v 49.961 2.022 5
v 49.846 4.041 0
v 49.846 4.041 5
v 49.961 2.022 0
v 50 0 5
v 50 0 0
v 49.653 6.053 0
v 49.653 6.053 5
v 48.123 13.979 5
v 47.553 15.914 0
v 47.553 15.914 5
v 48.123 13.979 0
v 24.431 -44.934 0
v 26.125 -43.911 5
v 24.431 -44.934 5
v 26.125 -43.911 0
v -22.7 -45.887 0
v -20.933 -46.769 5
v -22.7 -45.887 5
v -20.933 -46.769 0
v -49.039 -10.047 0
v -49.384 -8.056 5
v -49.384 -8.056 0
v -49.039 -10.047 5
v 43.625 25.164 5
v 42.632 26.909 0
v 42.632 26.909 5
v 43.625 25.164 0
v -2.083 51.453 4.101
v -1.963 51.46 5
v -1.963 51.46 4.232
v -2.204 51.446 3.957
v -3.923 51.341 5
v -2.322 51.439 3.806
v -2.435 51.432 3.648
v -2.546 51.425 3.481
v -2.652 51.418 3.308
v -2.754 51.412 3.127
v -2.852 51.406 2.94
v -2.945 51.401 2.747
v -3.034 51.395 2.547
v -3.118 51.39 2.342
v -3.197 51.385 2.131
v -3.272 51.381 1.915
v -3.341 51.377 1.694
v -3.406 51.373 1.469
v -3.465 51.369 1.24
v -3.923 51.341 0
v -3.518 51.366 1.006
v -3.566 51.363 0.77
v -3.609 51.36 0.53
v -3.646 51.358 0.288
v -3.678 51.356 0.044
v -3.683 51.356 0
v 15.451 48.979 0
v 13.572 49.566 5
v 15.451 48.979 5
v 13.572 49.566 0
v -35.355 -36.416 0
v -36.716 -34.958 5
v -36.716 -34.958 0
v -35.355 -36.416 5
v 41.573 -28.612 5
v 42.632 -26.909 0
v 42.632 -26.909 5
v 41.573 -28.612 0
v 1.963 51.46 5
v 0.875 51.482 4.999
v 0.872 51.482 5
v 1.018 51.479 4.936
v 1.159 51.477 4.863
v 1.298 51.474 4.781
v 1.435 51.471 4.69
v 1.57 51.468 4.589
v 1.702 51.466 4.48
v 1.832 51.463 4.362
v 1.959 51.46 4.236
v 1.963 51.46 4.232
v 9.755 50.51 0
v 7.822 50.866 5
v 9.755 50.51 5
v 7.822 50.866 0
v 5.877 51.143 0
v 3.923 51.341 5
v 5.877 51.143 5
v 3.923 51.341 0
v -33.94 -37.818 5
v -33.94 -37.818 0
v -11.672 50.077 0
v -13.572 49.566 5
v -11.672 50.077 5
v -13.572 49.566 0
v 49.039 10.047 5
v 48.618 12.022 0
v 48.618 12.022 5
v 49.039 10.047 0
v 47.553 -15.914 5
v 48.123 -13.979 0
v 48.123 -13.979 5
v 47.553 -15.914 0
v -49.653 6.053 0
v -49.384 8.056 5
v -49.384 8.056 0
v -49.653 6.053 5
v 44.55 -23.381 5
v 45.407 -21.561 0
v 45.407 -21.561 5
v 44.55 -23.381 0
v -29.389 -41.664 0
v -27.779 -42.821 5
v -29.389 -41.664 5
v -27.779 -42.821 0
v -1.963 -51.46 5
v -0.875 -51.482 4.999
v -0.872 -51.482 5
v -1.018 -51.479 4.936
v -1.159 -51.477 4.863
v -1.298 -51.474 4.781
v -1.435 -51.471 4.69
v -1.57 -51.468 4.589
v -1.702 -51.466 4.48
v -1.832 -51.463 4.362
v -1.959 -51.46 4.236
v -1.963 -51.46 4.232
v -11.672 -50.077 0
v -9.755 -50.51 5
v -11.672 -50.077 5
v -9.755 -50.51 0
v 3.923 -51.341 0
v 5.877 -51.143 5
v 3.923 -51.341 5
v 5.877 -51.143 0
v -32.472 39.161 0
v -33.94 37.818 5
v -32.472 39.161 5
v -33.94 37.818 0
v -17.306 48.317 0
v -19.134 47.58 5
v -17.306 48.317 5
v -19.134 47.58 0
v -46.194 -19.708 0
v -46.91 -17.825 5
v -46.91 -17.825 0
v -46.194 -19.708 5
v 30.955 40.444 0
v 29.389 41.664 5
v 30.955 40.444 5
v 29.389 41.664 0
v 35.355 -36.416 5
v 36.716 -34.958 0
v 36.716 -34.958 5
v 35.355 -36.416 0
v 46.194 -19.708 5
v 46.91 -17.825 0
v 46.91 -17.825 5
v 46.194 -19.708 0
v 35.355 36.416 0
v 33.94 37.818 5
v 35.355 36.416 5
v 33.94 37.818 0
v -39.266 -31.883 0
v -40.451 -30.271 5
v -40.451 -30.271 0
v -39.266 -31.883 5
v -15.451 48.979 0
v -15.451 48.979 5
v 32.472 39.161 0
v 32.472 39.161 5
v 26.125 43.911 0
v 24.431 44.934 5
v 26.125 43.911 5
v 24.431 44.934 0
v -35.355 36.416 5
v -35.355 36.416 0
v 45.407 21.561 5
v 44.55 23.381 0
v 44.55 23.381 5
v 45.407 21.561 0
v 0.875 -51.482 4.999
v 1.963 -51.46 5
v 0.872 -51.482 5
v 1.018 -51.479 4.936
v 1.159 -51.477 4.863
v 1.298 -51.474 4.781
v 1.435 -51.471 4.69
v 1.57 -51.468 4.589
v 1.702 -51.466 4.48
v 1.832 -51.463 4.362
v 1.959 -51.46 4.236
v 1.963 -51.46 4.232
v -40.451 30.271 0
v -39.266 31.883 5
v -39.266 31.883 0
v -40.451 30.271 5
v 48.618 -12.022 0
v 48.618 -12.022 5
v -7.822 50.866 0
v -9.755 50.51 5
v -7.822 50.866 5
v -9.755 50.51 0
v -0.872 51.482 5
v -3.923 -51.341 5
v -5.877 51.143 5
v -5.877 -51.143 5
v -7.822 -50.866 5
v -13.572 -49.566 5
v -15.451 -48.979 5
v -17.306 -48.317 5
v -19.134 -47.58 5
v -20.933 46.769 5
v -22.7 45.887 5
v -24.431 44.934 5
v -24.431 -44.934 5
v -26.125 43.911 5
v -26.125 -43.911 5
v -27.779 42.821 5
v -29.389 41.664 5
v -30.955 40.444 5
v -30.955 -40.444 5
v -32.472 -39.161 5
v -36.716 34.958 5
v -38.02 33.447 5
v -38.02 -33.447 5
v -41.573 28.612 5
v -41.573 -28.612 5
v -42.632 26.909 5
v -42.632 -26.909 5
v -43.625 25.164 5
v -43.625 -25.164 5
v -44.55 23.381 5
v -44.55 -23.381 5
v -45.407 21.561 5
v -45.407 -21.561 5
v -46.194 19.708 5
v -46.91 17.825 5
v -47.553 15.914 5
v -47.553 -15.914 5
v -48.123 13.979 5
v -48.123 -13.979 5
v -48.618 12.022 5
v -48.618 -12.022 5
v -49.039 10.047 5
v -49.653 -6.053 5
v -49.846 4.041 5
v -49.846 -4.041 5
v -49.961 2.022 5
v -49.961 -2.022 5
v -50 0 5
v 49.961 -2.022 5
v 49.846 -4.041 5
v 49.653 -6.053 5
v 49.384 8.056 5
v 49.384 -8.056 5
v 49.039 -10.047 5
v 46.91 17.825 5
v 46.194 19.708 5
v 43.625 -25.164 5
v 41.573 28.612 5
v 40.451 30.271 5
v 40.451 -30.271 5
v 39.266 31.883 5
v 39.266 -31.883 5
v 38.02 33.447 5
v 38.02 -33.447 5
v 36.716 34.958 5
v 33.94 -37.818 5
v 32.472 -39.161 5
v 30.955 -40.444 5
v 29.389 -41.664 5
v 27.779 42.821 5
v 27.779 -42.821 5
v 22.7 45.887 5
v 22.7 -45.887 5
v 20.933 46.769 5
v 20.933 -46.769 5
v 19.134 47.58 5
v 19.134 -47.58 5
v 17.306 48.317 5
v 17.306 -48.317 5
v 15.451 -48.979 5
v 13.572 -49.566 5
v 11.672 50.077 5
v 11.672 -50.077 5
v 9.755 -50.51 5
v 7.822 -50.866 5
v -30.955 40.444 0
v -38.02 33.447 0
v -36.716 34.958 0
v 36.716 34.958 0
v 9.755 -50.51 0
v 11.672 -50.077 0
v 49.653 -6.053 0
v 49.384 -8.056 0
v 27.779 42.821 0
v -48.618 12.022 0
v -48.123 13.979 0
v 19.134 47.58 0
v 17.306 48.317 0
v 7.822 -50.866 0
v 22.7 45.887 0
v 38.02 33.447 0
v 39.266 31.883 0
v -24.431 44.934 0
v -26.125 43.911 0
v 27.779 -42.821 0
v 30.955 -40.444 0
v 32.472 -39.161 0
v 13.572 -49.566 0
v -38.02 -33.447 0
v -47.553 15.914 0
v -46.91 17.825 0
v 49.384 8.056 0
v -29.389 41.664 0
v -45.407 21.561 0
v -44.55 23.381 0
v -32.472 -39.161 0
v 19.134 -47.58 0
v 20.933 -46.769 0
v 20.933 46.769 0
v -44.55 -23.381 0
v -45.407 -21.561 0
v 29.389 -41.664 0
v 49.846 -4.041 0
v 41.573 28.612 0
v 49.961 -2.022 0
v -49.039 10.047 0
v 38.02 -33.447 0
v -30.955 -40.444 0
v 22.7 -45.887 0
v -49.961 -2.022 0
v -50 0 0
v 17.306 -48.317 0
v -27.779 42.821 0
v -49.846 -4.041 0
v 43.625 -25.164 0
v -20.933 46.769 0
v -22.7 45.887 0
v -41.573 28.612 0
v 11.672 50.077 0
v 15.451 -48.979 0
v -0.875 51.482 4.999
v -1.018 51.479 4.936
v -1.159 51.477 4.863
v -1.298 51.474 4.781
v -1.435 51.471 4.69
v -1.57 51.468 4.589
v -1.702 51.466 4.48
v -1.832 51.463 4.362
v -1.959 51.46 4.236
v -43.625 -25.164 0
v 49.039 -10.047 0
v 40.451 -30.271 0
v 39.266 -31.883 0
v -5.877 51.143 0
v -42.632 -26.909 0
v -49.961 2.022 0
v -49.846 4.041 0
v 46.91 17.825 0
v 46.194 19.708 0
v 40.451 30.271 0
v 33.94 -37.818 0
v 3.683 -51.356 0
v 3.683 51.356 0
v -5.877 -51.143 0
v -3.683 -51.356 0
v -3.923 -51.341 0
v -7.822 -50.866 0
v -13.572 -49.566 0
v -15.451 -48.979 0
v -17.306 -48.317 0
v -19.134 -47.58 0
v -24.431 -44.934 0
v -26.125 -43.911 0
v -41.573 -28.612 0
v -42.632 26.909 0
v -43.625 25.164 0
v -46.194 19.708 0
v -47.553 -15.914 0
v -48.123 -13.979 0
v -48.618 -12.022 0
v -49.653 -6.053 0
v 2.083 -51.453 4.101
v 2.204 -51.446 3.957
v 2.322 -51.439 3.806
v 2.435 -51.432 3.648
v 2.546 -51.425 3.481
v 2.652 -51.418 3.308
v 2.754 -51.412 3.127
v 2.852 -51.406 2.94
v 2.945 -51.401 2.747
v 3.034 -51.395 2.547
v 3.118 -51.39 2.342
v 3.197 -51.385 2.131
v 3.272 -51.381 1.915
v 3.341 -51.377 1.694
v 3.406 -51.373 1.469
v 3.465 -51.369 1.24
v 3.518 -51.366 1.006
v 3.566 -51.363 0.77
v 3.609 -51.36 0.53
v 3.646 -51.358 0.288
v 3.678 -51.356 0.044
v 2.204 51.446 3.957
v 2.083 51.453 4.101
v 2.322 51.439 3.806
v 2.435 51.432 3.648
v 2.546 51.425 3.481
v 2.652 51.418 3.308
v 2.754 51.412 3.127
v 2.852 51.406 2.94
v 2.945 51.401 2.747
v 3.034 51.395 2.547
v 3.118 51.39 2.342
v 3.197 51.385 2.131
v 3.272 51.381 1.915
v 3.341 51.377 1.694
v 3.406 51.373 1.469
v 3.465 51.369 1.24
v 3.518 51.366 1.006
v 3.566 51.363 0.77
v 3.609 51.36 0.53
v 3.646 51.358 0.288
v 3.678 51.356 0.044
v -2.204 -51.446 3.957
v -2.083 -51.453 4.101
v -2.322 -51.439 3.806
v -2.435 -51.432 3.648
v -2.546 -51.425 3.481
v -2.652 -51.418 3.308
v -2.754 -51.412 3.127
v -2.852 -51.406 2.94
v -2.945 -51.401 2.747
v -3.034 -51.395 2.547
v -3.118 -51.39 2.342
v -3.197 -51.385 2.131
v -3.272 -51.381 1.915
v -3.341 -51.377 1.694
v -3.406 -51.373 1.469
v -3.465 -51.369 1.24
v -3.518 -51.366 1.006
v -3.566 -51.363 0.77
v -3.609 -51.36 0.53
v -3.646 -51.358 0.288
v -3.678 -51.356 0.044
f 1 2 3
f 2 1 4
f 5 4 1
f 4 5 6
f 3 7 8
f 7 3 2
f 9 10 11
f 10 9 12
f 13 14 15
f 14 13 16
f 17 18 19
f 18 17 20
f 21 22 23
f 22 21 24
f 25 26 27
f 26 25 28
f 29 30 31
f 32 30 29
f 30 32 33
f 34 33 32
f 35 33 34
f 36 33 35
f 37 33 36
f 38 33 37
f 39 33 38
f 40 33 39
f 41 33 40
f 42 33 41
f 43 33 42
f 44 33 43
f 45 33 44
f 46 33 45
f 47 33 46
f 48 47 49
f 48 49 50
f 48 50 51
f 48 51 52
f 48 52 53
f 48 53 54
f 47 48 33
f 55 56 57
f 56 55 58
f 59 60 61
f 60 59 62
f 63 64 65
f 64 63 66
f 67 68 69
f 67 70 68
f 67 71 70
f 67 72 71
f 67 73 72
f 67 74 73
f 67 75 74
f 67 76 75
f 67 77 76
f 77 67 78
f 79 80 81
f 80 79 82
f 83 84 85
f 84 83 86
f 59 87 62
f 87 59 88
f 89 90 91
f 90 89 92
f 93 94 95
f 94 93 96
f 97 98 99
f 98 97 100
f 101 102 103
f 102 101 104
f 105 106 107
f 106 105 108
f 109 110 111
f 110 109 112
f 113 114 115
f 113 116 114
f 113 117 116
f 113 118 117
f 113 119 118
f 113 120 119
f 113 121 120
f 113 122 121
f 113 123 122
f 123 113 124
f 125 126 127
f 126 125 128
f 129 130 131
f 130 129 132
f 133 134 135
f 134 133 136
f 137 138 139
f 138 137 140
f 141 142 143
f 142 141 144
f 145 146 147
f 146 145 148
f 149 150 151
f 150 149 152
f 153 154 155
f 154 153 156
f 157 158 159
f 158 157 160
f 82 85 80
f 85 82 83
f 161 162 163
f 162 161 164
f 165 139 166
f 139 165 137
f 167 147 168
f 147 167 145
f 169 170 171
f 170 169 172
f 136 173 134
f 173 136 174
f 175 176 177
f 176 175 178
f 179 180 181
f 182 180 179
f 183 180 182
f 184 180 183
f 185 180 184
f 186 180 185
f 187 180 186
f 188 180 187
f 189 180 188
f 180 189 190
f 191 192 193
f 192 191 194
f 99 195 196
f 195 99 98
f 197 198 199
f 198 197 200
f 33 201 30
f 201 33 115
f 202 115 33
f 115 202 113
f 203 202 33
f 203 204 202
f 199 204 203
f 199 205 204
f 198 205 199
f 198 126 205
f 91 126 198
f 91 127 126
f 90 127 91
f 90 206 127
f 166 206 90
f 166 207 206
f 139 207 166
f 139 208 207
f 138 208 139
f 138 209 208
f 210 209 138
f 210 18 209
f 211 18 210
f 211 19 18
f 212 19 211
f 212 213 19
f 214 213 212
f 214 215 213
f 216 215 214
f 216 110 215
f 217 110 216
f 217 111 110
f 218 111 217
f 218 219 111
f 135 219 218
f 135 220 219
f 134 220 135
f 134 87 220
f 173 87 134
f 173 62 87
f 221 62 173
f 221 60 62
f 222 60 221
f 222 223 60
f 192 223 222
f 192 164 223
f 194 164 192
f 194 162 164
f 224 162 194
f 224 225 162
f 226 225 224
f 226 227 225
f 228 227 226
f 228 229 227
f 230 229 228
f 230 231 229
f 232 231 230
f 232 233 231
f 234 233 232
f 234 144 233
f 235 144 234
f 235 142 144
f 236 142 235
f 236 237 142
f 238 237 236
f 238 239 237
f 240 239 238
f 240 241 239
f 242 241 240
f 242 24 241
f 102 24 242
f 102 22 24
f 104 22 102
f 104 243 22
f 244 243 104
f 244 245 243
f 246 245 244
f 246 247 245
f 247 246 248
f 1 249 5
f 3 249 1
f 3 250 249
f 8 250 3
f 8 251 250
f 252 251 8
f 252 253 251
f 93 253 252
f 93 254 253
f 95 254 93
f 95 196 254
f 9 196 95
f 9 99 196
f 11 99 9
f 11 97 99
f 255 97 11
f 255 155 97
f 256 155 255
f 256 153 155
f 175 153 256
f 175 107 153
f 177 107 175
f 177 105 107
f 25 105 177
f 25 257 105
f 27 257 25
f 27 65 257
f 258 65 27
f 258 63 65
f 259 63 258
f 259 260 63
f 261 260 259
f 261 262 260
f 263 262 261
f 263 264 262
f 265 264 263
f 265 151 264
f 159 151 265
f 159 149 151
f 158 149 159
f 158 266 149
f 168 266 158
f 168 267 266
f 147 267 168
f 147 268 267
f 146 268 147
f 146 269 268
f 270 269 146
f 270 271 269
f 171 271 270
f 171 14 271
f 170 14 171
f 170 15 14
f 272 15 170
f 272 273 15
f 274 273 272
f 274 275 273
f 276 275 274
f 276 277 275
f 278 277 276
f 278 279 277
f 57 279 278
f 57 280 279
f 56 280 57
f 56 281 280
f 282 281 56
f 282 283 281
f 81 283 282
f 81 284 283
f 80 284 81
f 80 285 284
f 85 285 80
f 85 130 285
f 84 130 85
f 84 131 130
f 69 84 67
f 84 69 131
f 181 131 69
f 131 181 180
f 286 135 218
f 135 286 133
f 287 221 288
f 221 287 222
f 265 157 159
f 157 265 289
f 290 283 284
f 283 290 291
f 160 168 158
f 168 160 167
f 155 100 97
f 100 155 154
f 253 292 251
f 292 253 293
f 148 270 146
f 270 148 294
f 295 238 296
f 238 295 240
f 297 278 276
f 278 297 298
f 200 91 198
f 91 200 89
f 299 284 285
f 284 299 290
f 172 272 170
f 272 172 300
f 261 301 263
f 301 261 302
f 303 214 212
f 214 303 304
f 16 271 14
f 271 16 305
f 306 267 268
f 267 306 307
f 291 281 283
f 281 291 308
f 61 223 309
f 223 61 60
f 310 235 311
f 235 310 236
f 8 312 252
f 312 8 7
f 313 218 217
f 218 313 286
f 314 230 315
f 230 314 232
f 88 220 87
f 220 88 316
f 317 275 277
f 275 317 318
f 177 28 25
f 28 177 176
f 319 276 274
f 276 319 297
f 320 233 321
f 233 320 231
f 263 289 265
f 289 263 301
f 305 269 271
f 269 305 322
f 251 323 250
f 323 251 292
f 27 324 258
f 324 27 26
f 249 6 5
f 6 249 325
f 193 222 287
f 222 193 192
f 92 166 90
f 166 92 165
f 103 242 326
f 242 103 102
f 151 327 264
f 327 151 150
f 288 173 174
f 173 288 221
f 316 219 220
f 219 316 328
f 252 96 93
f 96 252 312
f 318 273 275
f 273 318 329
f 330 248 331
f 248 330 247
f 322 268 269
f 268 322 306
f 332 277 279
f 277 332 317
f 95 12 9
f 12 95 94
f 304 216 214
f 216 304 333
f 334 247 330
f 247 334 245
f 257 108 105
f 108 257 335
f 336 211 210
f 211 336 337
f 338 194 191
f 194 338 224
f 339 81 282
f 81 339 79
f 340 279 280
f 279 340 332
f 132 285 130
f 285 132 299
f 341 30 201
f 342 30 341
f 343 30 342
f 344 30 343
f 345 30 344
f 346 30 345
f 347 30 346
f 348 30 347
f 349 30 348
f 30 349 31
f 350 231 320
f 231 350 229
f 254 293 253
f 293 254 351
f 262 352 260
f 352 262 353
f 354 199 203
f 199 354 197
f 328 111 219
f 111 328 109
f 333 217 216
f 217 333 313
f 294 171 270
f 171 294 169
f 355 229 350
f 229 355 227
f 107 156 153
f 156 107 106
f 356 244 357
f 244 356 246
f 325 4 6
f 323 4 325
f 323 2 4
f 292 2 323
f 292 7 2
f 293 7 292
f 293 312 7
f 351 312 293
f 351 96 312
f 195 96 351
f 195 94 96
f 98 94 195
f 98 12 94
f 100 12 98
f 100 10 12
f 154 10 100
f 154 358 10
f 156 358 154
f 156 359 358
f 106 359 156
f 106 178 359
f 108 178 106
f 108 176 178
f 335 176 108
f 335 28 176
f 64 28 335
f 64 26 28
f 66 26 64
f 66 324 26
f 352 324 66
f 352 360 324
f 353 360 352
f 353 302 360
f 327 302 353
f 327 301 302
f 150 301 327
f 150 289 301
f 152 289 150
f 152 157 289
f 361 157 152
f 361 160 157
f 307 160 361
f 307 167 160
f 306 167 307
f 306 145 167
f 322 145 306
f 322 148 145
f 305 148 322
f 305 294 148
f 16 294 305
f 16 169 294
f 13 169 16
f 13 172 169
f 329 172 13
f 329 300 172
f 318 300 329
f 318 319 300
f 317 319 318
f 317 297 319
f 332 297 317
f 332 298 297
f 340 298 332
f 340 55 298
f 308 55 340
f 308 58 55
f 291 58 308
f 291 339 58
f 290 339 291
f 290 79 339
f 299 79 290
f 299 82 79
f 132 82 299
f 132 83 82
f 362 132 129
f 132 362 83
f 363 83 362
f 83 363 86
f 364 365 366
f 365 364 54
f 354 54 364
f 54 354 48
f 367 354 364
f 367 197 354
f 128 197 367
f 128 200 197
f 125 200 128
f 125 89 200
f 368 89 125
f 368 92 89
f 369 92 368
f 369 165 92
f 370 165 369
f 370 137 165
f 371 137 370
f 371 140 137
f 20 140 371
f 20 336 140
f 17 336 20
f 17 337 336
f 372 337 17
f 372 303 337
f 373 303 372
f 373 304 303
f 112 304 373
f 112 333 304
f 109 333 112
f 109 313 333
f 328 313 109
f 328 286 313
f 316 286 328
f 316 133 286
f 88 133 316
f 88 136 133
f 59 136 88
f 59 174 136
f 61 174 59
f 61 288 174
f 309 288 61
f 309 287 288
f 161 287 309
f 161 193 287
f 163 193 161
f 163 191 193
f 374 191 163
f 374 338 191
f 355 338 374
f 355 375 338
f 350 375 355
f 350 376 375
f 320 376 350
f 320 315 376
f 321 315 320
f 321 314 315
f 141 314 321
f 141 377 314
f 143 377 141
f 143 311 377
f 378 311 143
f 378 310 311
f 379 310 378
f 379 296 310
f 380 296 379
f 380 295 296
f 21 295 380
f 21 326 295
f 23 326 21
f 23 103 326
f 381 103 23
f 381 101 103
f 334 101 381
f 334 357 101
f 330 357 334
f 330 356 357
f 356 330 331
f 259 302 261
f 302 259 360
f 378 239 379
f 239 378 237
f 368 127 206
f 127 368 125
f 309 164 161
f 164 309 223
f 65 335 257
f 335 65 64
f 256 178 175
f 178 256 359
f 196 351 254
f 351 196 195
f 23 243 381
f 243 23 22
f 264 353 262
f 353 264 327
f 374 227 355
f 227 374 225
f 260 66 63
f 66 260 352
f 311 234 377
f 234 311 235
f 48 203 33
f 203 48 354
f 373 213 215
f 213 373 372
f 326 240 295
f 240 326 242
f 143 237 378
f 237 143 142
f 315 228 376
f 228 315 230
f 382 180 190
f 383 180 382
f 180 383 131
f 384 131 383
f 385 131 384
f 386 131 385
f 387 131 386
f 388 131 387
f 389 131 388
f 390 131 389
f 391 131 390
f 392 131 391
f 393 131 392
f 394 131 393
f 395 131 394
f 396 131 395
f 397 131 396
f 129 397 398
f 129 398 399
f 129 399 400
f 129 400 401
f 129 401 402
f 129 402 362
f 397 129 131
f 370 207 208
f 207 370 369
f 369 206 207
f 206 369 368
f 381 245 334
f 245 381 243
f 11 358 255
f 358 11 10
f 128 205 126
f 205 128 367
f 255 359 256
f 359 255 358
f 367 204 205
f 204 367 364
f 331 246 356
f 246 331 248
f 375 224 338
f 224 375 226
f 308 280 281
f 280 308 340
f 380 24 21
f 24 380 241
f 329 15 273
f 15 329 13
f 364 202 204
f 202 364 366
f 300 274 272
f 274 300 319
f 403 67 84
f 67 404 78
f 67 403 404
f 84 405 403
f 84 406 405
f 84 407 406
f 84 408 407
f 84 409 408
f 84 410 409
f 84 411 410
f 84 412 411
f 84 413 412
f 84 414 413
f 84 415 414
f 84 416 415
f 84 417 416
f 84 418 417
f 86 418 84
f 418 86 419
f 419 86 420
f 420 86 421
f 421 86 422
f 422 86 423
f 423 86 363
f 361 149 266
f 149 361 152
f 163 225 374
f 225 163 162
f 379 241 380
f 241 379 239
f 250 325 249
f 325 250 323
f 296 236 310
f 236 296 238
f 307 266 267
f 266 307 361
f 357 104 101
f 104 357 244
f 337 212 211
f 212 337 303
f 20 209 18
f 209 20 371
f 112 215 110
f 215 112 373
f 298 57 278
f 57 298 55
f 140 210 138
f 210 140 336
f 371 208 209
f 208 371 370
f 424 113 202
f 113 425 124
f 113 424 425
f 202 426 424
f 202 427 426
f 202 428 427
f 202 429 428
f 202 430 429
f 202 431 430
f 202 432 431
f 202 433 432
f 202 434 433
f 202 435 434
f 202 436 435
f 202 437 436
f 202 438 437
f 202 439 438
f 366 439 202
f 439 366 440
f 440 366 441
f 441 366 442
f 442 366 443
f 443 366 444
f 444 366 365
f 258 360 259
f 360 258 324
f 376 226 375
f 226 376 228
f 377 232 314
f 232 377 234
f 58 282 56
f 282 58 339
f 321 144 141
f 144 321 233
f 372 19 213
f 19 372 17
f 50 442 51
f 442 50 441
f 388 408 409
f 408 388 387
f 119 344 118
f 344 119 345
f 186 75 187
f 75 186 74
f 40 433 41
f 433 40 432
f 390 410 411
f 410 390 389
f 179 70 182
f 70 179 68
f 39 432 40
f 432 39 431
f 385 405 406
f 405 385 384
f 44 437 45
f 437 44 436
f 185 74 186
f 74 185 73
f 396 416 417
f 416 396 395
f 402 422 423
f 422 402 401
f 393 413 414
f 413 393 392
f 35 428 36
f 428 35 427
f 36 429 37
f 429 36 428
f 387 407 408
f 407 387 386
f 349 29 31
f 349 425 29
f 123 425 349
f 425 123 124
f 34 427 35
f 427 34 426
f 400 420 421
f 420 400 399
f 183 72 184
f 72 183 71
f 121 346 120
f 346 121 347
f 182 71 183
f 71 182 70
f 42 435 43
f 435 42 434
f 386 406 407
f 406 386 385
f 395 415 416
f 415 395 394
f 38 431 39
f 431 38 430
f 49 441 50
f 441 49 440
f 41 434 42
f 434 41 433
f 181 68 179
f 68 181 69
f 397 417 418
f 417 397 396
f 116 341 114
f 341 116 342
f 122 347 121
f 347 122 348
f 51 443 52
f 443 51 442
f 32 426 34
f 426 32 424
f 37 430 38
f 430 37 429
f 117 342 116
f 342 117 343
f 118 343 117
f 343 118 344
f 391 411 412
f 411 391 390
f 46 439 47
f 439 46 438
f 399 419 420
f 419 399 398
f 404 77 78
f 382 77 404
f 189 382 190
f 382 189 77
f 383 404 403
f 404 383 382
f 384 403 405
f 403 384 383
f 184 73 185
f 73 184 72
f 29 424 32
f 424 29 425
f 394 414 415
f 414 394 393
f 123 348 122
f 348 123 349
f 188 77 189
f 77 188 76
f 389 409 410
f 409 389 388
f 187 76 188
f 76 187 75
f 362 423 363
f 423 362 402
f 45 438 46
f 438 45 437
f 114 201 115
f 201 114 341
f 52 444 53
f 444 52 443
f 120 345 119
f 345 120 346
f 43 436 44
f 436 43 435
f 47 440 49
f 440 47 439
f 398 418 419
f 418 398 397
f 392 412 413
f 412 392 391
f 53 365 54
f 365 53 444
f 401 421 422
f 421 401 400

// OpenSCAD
WIDTH = /*             */ 100;
LENGTH = /*            */ 103;
HEIGHT = /*              */ 5;

FRONT_SLIT = /*         */ 6;
BACK_SLIT = /*          */ 21.3;

TENON_HEIGHT = /*        */ 2;


$fn = $preview ? 60 : 160;
ATOM = 0.01;
PLAY = .35;

module cylinder0(factor = 0, height = 0, l = LENGTH, w = WIDTH) {
    h = factor ? HEIGHT * factor : height;
    resize([ w, l, h ]) cylinder(d = 10, h = 1);
}

module channel() {
    hull() {
    for (i = [ -1, 1 ]) {
        translate([ 0, i * LENGTH, -FRONT_SLIT * .2 ])
        rotate([ 90, 0, 0 ])
        scale([ 1, 1.7, 1 ]) cylinder(d = FRONT_SLIT * 1.25, h = ATOM);
    }
    }
}

module base() {
    cylinder0(factor = 1);

    intersection() {
        h = HEIGHT / 3 + TENON_HEIGHT;
        translate([ 0, 0, HEIGHT * .75 ])
        hull() {
%            translate([ 0, -LENGTH / 2, h / 2 ])
            cube([ FRONT_SLIT, LENGTH, h ], center = true);

 %           translate([ 0, LENGTH / 2, h / 2 ])
            cube([ BACK_SLIT, LENGTH, h ], center = true);
        }
        cylinder0(factor = 2);
    }
}

module concrete() {
    translate([ 0, 0, HEIGHT ])
    difference() {
        cylinder0(height = 96);

        // slanted top
        translate([ 0, LENGTH / 2, 96 ])
        rotate([ 38, 0, 0 ])
        translate([ 0, -LENGTH / 2, 0 ])
        cylinder(d = LENGTH * 4, h = 100);
    }
}

module stand_holder() {
    difference() {
        base();
        channel();
    }
}

%concrete();
stand_holder();
